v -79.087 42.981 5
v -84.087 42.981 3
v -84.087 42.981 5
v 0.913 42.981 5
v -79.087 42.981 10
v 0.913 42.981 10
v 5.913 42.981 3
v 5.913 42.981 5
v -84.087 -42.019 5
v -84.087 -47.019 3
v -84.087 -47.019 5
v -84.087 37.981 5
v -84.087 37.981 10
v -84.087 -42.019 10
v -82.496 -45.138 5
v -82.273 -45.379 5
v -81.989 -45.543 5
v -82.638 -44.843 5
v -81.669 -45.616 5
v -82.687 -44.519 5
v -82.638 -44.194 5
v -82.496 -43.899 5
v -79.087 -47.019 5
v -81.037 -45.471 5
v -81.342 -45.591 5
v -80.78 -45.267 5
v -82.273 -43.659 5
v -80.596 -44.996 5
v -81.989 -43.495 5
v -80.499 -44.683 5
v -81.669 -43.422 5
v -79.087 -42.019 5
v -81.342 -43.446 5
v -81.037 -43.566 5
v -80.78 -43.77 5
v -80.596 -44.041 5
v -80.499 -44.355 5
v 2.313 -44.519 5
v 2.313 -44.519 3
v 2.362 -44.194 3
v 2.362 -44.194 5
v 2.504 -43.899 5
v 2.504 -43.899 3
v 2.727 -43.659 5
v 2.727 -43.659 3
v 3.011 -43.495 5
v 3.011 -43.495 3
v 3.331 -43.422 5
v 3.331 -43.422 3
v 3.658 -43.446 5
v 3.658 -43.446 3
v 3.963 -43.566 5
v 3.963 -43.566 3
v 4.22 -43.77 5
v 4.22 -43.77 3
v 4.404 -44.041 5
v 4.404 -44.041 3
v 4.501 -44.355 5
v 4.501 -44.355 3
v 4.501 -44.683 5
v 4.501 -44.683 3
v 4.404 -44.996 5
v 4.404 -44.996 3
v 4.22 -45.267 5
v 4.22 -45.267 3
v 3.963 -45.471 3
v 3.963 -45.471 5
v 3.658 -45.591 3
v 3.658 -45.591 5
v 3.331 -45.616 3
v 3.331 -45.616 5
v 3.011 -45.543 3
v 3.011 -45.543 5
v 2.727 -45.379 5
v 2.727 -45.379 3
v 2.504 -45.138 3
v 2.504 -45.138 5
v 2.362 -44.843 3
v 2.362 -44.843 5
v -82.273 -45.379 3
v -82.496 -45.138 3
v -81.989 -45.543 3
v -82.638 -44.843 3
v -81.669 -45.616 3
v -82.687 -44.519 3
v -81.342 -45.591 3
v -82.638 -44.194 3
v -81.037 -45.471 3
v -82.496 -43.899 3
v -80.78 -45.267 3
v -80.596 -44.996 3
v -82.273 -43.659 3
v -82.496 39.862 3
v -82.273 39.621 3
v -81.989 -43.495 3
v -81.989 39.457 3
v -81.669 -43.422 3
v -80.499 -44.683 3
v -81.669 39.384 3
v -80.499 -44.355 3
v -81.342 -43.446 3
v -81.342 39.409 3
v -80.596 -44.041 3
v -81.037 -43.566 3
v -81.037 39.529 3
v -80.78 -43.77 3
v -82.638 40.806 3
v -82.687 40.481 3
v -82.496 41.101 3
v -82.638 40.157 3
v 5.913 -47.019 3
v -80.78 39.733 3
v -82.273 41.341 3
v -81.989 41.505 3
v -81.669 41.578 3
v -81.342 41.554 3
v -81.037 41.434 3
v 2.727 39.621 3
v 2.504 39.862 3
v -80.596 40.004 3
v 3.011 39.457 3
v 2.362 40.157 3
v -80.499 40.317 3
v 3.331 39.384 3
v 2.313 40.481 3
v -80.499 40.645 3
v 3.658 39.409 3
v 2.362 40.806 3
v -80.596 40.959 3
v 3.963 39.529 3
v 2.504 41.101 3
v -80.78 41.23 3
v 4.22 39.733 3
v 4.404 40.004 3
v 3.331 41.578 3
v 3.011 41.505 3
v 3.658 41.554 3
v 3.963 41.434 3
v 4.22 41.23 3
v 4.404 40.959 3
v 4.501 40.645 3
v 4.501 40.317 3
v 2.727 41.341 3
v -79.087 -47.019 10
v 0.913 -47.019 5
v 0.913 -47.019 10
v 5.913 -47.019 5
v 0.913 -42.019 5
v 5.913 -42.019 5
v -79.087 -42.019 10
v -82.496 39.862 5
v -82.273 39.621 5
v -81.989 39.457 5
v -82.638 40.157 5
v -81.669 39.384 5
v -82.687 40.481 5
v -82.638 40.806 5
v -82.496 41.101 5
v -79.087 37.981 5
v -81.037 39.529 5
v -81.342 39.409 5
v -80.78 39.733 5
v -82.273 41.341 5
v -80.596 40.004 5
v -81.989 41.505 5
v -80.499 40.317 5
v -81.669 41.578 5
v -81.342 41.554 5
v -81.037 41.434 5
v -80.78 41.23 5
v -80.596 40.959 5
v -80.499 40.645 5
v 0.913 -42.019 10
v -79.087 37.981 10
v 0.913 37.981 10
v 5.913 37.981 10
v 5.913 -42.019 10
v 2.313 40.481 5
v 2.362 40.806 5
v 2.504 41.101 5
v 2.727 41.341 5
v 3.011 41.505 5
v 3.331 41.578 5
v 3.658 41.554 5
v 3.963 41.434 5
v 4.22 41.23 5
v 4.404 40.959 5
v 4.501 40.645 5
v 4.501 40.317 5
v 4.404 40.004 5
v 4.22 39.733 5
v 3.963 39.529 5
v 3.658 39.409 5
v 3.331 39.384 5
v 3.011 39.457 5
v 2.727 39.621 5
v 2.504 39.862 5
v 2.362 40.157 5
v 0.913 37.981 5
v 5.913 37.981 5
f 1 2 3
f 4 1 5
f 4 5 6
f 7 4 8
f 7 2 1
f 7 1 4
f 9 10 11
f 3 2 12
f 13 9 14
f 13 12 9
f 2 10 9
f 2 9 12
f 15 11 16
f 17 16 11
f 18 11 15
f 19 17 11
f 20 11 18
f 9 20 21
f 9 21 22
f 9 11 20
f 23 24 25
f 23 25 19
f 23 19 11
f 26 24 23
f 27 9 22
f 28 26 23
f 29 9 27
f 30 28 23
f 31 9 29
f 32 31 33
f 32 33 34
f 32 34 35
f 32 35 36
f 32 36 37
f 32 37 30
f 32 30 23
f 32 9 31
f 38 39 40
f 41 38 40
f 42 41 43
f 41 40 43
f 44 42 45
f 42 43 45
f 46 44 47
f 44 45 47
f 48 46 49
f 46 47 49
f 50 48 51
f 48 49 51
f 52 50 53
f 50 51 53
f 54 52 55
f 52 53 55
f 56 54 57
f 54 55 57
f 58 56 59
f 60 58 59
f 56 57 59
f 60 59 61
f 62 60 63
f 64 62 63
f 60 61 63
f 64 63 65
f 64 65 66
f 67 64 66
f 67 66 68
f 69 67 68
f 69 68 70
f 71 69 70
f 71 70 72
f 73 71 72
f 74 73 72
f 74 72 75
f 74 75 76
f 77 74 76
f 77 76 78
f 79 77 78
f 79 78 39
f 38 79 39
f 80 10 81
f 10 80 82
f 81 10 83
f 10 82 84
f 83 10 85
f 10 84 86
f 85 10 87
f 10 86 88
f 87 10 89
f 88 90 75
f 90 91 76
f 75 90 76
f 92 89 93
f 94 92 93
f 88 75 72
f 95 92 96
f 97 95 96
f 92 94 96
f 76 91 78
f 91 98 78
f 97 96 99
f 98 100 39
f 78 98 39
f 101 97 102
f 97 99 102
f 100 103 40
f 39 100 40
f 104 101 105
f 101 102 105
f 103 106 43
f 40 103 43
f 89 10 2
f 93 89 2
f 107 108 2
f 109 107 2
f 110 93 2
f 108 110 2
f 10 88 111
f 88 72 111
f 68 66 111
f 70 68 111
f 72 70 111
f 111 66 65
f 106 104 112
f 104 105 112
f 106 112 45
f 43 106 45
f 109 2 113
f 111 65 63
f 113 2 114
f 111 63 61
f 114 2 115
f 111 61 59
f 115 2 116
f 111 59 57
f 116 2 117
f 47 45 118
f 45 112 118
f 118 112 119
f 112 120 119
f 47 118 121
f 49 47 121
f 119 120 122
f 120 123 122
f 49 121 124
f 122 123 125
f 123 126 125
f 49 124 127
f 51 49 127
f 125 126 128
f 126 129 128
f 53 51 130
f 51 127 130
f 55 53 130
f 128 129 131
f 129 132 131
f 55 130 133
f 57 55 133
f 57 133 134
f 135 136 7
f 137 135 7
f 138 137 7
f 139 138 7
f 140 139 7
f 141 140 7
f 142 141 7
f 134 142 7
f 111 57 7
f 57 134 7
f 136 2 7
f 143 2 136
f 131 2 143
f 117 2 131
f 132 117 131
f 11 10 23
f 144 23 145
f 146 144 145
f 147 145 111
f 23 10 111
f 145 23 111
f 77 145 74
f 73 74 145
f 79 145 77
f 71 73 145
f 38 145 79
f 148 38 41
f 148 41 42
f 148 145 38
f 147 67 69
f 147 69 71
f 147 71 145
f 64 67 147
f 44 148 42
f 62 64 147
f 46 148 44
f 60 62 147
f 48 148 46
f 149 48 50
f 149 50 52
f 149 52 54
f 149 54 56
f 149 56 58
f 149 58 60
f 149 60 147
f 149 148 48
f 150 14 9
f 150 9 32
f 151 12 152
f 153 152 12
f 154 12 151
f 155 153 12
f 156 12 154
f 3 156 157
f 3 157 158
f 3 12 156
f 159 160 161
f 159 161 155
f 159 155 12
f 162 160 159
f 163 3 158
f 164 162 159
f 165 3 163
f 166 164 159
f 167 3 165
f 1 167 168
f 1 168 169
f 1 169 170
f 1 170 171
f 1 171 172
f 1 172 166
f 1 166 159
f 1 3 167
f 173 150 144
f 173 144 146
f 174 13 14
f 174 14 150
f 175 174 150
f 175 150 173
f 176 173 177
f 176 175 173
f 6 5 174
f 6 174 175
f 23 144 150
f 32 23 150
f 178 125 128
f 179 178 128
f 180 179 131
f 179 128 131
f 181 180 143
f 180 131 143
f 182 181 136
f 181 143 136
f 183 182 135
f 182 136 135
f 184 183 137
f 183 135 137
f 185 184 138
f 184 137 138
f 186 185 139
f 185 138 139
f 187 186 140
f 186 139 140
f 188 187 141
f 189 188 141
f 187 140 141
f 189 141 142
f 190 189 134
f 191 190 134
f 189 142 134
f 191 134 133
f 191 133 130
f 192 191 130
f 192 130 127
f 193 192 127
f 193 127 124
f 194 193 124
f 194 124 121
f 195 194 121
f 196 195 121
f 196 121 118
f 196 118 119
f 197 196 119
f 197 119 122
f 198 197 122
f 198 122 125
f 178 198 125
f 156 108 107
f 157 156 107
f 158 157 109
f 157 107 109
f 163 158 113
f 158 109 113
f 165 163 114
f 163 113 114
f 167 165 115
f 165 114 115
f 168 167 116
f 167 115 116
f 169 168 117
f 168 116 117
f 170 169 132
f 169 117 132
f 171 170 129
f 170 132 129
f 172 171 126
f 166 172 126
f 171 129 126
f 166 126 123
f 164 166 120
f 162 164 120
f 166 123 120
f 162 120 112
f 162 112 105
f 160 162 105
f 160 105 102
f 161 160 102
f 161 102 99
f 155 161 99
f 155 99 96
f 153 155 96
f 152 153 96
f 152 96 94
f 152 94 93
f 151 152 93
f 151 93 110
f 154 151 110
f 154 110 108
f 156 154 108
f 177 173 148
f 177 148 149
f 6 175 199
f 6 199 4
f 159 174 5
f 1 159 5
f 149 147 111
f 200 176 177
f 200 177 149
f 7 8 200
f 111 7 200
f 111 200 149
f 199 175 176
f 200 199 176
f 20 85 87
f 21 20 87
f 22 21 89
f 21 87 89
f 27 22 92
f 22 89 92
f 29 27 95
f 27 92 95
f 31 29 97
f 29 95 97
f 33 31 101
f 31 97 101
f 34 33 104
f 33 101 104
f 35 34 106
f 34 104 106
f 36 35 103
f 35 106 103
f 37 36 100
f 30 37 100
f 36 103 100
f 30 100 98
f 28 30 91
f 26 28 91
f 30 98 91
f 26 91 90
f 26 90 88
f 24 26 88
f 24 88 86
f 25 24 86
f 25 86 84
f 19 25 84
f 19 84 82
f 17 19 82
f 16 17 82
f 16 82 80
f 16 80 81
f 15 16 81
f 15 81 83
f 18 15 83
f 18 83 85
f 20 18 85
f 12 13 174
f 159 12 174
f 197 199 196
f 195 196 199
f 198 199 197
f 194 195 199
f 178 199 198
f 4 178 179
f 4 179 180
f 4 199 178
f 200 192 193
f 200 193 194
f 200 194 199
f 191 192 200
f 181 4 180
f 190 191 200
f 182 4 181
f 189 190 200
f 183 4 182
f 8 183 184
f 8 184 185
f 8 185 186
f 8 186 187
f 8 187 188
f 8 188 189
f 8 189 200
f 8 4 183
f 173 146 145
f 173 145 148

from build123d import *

# Parameters (mm, degrees)
SKETCH_1_W          = 100
SKETCH_1_H          = 90
EXTRUDE_1_DEPTH     = 10
SKETCH_6_W          = 5
SKETCH_6_H          = 5
CUT_EXTRUDE_4_DEPTH = 5
SKETCH_7_W          = 5
SKETCH_7_H          = 5
CUT_EXTRUDE_5_DEPTH = 3
SKETCH_8_R          = 1.1
CUT_EXTRUDE_6_DEPTH = 42
SKETCH_10_W         = 100
SKETCH_10_H         = 90
CUT_EXTRUDE_7_DEPTH = 3
SKETCH_11_W         = 7
SKETCH_11_H         = 90
CUT_EXTRUDE_8_DEPTH = 5
SKETCH_12_W         = 7
SKETCH_12_H         = 90
CUT_EXTRUDE_9_DEPTH = 5


with BuildPart() as part:
    # 草圖1 → 填料-伸長1 (new body)
    with BuildSketch(Plane.XY):
        with Locations((-39.08671555, -2.01863354)):
            Rectangle(SKETCH_1_W, SKETCH_1_H)
    extrude(amount=EXTRUDE_1_DEPTH)

    # 草圖6 → 除料-伸長4 (cut)
    with BuildSketch(Plane.XY.offset(10)):
        with Locations((3.41328445, 40.48136646)):
            Rectangle(SKETCH_6_W, SKETCH_6_H)
        with Locations((-81.58671555, 40.48136646)):
            Rectangle(SKETCH_6_W, SKETCH_6_H)
        with Locations((-81.58671555, -44.51863354)):
            Rectangle(SKETCH_6_W, SKETCH_6_H)
        with Locations((3.41328445, -44.51863354)):
            Rectangle(SKETCH_6_W, SKETCH_6_H)
    extrude(amount=-CUT_EXTRUDE_4_DEPTH, mode=Mode.SUBTRACT)

    # 草圖7 → 除料-伸長5 (cut)
    with BuildSketch(Plane(origin=(0, 0, 0), x_dir=(-1, 0, 0), z_dir=(0, 0, -1))):
        with Locations((81.58671555, 40.48136646)):
            Rectangle(SKETCH_7_W, SKETCH_7_H)
        with Locations((-3.41328445, 40.48136646)):
            Rectangle(SKETCH_7_W, SKETCH_7_H)
        with Locations((81.58671555, -44.51863354)):
            Rectangle(SKETCH_7_W, SKETCH_7_H)
        with Locations((-3.41328445, -44.51863354)):
            Rectangle(SKETCH_7_W, SKETCH_7_H)
    extrude(amount=-CUT_EXTRUDE_5_DEPTH, mode=Mode.SUBTRACT)

    # 草圖8 → 除料-伸長6 (cut)
    with BuildSketch(Plane(origin=(0, 0, 0), x_dir=(-1, 0, 0), z_dir=(0, 0, -1))):
        with Locations((-3.41328445, 40.48136646)):
            Circle(SKETCH_8_R)
        with Locations((81.58671555, 40.48136646)):
            Circle(SKETCH_8_R)
        with Locations((81.58671555, -44.51863354)):
            Circle(SKETCH_8_R)
        with Locations((-3.41328445, -44.51863354)):
            Circle(SKETCH_8_R)
    extrude(amount=-CUT_EXTRUDE_6_DEPTH, mode=Mode.SUBTRACT)

    # 草圖10 → 除料-伸長7 (cut)
    with BuildSketch(Plane.XY):
        with Locations((-39.08671555, -2.01863354)):
            Rectangle(SKETCH_10_W, SKETCH_10_H)
    extrude(amount=CUT_EXTRUDE_7_DEPTH, mode=Mode.SUBTRACT)

    # 草圖11 → 除料-伸長8 (cut)
    with BuildSketch(Plane(origin=(10.91328445, 0, 0), x_dir=(0, 0, -1), z_dir=(1, 0, 0))):
        with Locations((-6.5, -2.01863354)):
            Rectangle(SKETCH_11_W, SKETCH_11_H)
    extrude(amount=-CUT_EXTRUDE_8_DEPTH, mode=Mode.SUBTRACT)

    # 草圖12 → 除料-伸長9 (cut)
    with BuildSketch(Plane.ZY.offset(89.08671555)):
        with Locations((6.5, -2.01863354)):
            Rectangle(SKETCH_12_W, SKETCH_12_H)
    extrude(amount=-CUT_EXTRUDE_9_DEPTH, mode=Mode.SUBTRACT)


solid = part.part
